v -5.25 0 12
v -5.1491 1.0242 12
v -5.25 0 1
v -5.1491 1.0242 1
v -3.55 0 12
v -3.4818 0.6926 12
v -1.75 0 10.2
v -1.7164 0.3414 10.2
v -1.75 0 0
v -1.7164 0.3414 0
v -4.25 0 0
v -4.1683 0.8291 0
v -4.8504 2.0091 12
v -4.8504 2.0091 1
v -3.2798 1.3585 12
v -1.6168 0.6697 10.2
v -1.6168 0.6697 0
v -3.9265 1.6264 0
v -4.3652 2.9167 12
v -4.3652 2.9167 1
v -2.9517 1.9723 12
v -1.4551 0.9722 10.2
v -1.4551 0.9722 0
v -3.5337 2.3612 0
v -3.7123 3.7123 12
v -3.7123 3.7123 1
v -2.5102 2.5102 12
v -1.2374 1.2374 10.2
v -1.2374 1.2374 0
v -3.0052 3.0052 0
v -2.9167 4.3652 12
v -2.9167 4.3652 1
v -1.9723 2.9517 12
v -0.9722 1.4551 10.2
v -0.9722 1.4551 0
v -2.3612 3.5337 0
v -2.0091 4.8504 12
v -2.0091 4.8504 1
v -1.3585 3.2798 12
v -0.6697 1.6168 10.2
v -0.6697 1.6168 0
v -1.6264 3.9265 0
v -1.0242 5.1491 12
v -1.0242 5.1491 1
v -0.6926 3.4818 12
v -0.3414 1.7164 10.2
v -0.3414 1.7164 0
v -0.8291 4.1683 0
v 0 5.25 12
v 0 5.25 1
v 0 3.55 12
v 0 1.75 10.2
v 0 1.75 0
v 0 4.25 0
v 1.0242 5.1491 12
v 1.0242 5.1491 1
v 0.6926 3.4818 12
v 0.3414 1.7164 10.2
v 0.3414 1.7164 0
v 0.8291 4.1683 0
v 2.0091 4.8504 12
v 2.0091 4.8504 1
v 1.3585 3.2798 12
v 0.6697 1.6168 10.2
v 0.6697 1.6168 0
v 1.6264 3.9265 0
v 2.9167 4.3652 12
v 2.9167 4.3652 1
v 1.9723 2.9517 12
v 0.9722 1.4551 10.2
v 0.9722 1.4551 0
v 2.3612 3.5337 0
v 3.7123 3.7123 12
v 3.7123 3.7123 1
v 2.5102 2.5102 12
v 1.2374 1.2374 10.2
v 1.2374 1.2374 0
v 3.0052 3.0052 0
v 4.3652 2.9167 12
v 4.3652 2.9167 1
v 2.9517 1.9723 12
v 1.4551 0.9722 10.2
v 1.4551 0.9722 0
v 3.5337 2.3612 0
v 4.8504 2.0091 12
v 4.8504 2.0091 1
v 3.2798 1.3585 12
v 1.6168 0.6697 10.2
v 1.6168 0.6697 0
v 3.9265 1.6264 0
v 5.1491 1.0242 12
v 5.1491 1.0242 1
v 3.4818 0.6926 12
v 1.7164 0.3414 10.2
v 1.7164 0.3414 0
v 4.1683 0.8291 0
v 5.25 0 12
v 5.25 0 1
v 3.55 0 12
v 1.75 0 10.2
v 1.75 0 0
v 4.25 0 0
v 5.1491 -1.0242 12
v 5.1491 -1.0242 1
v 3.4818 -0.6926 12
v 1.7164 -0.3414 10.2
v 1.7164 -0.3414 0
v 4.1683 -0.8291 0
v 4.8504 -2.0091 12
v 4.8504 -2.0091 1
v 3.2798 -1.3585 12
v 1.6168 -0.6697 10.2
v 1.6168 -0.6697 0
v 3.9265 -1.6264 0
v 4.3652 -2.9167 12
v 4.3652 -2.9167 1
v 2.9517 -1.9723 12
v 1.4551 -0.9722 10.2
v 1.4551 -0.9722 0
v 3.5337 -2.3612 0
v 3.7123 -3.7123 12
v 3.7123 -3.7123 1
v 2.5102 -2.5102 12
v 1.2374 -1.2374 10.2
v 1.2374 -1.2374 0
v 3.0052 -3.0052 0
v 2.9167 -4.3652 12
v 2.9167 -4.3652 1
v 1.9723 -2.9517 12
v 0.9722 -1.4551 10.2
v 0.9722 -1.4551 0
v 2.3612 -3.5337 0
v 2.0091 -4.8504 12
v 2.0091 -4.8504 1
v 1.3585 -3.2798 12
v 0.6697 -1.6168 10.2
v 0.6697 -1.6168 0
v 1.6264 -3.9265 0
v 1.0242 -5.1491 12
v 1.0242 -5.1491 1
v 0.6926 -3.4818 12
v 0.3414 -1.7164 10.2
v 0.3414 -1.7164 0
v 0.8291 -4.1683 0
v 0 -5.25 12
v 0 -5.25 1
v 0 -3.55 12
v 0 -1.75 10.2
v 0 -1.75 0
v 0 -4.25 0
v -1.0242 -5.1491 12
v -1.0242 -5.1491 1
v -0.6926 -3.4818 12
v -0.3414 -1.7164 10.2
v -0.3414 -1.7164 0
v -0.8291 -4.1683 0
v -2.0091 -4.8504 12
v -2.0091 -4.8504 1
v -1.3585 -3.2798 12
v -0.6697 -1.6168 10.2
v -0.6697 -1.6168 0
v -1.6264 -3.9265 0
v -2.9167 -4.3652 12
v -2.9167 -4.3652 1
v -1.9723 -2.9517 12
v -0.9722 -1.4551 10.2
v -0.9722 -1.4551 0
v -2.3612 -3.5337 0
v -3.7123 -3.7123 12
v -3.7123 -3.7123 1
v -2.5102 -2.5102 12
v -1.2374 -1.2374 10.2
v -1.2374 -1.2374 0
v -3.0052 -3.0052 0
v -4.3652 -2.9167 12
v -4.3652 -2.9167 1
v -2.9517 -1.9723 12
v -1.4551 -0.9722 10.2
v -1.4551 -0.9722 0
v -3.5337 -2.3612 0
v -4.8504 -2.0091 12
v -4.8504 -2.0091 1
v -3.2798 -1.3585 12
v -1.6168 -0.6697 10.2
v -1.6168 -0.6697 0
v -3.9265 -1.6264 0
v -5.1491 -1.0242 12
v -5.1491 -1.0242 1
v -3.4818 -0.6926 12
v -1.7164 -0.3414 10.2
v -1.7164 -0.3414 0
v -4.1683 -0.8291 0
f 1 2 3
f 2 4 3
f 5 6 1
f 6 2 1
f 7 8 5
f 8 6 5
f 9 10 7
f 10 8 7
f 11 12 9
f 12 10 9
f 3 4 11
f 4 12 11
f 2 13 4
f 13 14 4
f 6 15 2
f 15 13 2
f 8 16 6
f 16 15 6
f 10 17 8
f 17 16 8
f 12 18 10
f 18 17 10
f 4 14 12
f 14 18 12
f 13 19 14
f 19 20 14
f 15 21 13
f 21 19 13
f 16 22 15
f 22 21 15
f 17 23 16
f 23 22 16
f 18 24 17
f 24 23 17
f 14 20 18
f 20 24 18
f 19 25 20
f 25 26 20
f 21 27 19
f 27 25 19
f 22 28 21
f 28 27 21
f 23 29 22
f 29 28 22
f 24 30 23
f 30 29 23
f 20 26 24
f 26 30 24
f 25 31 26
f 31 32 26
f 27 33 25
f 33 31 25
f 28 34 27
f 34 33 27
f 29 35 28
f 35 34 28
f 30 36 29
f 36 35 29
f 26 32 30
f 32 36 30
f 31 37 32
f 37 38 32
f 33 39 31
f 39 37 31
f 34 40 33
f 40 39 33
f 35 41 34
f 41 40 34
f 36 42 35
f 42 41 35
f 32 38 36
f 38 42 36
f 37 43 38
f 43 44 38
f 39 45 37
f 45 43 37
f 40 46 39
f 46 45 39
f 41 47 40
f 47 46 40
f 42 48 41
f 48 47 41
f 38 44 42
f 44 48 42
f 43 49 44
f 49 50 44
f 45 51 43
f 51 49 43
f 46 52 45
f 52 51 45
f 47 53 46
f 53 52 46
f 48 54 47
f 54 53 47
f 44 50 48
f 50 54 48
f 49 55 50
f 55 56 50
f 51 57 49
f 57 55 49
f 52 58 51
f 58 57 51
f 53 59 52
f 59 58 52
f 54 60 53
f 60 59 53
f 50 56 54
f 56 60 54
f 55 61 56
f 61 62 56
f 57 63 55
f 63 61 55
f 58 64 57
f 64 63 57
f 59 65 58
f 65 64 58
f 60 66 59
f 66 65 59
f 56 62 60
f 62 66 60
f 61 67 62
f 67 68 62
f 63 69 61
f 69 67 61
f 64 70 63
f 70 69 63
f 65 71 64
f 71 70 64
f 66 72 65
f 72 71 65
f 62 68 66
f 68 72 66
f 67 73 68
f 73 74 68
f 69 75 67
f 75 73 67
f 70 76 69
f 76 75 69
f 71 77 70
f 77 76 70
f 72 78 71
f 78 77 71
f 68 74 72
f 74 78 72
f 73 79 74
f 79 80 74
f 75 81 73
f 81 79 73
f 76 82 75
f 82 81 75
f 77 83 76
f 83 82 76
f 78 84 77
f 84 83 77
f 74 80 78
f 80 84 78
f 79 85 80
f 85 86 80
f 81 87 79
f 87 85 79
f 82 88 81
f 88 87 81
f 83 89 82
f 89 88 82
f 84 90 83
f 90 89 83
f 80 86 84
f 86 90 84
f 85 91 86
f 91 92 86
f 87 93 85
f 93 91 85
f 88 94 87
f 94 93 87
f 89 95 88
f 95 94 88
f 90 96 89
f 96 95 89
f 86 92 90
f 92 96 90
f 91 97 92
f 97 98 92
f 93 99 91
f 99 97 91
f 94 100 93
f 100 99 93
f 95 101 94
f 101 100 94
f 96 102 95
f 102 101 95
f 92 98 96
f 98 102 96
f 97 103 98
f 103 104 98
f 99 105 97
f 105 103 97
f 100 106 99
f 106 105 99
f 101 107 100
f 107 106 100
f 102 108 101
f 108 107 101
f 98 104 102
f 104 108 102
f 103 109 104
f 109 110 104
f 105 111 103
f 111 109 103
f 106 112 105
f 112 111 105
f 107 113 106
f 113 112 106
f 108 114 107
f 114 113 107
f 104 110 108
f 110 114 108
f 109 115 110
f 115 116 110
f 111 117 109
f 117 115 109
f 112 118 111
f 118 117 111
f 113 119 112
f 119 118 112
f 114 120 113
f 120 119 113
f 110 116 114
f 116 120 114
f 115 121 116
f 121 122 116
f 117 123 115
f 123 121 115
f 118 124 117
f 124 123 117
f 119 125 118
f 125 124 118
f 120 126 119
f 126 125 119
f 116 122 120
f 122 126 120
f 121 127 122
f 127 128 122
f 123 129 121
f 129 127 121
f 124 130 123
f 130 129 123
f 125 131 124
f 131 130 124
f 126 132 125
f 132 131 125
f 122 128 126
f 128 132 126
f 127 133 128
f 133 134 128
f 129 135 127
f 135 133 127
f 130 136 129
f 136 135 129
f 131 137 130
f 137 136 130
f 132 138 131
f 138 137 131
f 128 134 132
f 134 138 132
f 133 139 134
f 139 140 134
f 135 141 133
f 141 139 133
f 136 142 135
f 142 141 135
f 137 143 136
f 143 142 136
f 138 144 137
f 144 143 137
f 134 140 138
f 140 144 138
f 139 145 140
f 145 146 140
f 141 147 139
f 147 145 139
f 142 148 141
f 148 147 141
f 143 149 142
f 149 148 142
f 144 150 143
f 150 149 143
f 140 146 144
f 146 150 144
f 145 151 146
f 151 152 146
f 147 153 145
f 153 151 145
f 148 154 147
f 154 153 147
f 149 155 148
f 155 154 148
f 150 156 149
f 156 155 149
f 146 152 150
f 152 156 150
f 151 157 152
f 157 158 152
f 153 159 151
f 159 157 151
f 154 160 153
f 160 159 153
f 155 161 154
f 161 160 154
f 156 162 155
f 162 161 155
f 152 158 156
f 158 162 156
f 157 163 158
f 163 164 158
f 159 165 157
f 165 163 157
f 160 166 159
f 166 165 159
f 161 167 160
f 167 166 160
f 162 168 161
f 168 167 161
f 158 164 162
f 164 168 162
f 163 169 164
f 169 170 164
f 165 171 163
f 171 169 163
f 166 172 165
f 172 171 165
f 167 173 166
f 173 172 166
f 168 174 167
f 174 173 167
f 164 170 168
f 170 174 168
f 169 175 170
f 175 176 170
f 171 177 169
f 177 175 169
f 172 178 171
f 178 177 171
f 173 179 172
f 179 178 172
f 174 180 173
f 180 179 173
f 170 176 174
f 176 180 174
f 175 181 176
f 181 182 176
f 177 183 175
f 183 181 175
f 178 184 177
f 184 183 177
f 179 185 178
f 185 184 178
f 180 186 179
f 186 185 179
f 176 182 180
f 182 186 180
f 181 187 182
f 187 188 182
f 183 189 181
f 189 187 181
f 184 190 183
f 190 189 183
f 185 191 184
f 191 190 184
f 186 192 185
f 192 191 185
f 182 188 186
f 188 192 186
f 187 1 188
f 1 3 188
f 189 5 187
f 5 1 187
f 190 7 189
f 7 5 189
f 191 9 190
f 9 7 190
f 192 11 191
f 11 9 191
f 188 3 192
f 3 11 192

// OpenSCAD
$fn = 32;

// ----------------------------------------------------------------------
// Form washer: countersunk washer, 10.5 mm outside, 3.5 mm bore
// ----------------------------------------------------------------------

// --- parameters (mm) ---
revolve_angle = 360;      // full turn around the Z axis
profile_points = 6;       // points of the closed outline

profile = [[1.75, 0], [4.25, 0], [5.25, 1], [5.25, 12], [3.55, 12], [1.75, 10.2]];  // single closed polygon, 6 points, counter clockwise

// --- the one profile operation ---
rotate_extrude(angle = revolve_angle) polygon(points = profile);
